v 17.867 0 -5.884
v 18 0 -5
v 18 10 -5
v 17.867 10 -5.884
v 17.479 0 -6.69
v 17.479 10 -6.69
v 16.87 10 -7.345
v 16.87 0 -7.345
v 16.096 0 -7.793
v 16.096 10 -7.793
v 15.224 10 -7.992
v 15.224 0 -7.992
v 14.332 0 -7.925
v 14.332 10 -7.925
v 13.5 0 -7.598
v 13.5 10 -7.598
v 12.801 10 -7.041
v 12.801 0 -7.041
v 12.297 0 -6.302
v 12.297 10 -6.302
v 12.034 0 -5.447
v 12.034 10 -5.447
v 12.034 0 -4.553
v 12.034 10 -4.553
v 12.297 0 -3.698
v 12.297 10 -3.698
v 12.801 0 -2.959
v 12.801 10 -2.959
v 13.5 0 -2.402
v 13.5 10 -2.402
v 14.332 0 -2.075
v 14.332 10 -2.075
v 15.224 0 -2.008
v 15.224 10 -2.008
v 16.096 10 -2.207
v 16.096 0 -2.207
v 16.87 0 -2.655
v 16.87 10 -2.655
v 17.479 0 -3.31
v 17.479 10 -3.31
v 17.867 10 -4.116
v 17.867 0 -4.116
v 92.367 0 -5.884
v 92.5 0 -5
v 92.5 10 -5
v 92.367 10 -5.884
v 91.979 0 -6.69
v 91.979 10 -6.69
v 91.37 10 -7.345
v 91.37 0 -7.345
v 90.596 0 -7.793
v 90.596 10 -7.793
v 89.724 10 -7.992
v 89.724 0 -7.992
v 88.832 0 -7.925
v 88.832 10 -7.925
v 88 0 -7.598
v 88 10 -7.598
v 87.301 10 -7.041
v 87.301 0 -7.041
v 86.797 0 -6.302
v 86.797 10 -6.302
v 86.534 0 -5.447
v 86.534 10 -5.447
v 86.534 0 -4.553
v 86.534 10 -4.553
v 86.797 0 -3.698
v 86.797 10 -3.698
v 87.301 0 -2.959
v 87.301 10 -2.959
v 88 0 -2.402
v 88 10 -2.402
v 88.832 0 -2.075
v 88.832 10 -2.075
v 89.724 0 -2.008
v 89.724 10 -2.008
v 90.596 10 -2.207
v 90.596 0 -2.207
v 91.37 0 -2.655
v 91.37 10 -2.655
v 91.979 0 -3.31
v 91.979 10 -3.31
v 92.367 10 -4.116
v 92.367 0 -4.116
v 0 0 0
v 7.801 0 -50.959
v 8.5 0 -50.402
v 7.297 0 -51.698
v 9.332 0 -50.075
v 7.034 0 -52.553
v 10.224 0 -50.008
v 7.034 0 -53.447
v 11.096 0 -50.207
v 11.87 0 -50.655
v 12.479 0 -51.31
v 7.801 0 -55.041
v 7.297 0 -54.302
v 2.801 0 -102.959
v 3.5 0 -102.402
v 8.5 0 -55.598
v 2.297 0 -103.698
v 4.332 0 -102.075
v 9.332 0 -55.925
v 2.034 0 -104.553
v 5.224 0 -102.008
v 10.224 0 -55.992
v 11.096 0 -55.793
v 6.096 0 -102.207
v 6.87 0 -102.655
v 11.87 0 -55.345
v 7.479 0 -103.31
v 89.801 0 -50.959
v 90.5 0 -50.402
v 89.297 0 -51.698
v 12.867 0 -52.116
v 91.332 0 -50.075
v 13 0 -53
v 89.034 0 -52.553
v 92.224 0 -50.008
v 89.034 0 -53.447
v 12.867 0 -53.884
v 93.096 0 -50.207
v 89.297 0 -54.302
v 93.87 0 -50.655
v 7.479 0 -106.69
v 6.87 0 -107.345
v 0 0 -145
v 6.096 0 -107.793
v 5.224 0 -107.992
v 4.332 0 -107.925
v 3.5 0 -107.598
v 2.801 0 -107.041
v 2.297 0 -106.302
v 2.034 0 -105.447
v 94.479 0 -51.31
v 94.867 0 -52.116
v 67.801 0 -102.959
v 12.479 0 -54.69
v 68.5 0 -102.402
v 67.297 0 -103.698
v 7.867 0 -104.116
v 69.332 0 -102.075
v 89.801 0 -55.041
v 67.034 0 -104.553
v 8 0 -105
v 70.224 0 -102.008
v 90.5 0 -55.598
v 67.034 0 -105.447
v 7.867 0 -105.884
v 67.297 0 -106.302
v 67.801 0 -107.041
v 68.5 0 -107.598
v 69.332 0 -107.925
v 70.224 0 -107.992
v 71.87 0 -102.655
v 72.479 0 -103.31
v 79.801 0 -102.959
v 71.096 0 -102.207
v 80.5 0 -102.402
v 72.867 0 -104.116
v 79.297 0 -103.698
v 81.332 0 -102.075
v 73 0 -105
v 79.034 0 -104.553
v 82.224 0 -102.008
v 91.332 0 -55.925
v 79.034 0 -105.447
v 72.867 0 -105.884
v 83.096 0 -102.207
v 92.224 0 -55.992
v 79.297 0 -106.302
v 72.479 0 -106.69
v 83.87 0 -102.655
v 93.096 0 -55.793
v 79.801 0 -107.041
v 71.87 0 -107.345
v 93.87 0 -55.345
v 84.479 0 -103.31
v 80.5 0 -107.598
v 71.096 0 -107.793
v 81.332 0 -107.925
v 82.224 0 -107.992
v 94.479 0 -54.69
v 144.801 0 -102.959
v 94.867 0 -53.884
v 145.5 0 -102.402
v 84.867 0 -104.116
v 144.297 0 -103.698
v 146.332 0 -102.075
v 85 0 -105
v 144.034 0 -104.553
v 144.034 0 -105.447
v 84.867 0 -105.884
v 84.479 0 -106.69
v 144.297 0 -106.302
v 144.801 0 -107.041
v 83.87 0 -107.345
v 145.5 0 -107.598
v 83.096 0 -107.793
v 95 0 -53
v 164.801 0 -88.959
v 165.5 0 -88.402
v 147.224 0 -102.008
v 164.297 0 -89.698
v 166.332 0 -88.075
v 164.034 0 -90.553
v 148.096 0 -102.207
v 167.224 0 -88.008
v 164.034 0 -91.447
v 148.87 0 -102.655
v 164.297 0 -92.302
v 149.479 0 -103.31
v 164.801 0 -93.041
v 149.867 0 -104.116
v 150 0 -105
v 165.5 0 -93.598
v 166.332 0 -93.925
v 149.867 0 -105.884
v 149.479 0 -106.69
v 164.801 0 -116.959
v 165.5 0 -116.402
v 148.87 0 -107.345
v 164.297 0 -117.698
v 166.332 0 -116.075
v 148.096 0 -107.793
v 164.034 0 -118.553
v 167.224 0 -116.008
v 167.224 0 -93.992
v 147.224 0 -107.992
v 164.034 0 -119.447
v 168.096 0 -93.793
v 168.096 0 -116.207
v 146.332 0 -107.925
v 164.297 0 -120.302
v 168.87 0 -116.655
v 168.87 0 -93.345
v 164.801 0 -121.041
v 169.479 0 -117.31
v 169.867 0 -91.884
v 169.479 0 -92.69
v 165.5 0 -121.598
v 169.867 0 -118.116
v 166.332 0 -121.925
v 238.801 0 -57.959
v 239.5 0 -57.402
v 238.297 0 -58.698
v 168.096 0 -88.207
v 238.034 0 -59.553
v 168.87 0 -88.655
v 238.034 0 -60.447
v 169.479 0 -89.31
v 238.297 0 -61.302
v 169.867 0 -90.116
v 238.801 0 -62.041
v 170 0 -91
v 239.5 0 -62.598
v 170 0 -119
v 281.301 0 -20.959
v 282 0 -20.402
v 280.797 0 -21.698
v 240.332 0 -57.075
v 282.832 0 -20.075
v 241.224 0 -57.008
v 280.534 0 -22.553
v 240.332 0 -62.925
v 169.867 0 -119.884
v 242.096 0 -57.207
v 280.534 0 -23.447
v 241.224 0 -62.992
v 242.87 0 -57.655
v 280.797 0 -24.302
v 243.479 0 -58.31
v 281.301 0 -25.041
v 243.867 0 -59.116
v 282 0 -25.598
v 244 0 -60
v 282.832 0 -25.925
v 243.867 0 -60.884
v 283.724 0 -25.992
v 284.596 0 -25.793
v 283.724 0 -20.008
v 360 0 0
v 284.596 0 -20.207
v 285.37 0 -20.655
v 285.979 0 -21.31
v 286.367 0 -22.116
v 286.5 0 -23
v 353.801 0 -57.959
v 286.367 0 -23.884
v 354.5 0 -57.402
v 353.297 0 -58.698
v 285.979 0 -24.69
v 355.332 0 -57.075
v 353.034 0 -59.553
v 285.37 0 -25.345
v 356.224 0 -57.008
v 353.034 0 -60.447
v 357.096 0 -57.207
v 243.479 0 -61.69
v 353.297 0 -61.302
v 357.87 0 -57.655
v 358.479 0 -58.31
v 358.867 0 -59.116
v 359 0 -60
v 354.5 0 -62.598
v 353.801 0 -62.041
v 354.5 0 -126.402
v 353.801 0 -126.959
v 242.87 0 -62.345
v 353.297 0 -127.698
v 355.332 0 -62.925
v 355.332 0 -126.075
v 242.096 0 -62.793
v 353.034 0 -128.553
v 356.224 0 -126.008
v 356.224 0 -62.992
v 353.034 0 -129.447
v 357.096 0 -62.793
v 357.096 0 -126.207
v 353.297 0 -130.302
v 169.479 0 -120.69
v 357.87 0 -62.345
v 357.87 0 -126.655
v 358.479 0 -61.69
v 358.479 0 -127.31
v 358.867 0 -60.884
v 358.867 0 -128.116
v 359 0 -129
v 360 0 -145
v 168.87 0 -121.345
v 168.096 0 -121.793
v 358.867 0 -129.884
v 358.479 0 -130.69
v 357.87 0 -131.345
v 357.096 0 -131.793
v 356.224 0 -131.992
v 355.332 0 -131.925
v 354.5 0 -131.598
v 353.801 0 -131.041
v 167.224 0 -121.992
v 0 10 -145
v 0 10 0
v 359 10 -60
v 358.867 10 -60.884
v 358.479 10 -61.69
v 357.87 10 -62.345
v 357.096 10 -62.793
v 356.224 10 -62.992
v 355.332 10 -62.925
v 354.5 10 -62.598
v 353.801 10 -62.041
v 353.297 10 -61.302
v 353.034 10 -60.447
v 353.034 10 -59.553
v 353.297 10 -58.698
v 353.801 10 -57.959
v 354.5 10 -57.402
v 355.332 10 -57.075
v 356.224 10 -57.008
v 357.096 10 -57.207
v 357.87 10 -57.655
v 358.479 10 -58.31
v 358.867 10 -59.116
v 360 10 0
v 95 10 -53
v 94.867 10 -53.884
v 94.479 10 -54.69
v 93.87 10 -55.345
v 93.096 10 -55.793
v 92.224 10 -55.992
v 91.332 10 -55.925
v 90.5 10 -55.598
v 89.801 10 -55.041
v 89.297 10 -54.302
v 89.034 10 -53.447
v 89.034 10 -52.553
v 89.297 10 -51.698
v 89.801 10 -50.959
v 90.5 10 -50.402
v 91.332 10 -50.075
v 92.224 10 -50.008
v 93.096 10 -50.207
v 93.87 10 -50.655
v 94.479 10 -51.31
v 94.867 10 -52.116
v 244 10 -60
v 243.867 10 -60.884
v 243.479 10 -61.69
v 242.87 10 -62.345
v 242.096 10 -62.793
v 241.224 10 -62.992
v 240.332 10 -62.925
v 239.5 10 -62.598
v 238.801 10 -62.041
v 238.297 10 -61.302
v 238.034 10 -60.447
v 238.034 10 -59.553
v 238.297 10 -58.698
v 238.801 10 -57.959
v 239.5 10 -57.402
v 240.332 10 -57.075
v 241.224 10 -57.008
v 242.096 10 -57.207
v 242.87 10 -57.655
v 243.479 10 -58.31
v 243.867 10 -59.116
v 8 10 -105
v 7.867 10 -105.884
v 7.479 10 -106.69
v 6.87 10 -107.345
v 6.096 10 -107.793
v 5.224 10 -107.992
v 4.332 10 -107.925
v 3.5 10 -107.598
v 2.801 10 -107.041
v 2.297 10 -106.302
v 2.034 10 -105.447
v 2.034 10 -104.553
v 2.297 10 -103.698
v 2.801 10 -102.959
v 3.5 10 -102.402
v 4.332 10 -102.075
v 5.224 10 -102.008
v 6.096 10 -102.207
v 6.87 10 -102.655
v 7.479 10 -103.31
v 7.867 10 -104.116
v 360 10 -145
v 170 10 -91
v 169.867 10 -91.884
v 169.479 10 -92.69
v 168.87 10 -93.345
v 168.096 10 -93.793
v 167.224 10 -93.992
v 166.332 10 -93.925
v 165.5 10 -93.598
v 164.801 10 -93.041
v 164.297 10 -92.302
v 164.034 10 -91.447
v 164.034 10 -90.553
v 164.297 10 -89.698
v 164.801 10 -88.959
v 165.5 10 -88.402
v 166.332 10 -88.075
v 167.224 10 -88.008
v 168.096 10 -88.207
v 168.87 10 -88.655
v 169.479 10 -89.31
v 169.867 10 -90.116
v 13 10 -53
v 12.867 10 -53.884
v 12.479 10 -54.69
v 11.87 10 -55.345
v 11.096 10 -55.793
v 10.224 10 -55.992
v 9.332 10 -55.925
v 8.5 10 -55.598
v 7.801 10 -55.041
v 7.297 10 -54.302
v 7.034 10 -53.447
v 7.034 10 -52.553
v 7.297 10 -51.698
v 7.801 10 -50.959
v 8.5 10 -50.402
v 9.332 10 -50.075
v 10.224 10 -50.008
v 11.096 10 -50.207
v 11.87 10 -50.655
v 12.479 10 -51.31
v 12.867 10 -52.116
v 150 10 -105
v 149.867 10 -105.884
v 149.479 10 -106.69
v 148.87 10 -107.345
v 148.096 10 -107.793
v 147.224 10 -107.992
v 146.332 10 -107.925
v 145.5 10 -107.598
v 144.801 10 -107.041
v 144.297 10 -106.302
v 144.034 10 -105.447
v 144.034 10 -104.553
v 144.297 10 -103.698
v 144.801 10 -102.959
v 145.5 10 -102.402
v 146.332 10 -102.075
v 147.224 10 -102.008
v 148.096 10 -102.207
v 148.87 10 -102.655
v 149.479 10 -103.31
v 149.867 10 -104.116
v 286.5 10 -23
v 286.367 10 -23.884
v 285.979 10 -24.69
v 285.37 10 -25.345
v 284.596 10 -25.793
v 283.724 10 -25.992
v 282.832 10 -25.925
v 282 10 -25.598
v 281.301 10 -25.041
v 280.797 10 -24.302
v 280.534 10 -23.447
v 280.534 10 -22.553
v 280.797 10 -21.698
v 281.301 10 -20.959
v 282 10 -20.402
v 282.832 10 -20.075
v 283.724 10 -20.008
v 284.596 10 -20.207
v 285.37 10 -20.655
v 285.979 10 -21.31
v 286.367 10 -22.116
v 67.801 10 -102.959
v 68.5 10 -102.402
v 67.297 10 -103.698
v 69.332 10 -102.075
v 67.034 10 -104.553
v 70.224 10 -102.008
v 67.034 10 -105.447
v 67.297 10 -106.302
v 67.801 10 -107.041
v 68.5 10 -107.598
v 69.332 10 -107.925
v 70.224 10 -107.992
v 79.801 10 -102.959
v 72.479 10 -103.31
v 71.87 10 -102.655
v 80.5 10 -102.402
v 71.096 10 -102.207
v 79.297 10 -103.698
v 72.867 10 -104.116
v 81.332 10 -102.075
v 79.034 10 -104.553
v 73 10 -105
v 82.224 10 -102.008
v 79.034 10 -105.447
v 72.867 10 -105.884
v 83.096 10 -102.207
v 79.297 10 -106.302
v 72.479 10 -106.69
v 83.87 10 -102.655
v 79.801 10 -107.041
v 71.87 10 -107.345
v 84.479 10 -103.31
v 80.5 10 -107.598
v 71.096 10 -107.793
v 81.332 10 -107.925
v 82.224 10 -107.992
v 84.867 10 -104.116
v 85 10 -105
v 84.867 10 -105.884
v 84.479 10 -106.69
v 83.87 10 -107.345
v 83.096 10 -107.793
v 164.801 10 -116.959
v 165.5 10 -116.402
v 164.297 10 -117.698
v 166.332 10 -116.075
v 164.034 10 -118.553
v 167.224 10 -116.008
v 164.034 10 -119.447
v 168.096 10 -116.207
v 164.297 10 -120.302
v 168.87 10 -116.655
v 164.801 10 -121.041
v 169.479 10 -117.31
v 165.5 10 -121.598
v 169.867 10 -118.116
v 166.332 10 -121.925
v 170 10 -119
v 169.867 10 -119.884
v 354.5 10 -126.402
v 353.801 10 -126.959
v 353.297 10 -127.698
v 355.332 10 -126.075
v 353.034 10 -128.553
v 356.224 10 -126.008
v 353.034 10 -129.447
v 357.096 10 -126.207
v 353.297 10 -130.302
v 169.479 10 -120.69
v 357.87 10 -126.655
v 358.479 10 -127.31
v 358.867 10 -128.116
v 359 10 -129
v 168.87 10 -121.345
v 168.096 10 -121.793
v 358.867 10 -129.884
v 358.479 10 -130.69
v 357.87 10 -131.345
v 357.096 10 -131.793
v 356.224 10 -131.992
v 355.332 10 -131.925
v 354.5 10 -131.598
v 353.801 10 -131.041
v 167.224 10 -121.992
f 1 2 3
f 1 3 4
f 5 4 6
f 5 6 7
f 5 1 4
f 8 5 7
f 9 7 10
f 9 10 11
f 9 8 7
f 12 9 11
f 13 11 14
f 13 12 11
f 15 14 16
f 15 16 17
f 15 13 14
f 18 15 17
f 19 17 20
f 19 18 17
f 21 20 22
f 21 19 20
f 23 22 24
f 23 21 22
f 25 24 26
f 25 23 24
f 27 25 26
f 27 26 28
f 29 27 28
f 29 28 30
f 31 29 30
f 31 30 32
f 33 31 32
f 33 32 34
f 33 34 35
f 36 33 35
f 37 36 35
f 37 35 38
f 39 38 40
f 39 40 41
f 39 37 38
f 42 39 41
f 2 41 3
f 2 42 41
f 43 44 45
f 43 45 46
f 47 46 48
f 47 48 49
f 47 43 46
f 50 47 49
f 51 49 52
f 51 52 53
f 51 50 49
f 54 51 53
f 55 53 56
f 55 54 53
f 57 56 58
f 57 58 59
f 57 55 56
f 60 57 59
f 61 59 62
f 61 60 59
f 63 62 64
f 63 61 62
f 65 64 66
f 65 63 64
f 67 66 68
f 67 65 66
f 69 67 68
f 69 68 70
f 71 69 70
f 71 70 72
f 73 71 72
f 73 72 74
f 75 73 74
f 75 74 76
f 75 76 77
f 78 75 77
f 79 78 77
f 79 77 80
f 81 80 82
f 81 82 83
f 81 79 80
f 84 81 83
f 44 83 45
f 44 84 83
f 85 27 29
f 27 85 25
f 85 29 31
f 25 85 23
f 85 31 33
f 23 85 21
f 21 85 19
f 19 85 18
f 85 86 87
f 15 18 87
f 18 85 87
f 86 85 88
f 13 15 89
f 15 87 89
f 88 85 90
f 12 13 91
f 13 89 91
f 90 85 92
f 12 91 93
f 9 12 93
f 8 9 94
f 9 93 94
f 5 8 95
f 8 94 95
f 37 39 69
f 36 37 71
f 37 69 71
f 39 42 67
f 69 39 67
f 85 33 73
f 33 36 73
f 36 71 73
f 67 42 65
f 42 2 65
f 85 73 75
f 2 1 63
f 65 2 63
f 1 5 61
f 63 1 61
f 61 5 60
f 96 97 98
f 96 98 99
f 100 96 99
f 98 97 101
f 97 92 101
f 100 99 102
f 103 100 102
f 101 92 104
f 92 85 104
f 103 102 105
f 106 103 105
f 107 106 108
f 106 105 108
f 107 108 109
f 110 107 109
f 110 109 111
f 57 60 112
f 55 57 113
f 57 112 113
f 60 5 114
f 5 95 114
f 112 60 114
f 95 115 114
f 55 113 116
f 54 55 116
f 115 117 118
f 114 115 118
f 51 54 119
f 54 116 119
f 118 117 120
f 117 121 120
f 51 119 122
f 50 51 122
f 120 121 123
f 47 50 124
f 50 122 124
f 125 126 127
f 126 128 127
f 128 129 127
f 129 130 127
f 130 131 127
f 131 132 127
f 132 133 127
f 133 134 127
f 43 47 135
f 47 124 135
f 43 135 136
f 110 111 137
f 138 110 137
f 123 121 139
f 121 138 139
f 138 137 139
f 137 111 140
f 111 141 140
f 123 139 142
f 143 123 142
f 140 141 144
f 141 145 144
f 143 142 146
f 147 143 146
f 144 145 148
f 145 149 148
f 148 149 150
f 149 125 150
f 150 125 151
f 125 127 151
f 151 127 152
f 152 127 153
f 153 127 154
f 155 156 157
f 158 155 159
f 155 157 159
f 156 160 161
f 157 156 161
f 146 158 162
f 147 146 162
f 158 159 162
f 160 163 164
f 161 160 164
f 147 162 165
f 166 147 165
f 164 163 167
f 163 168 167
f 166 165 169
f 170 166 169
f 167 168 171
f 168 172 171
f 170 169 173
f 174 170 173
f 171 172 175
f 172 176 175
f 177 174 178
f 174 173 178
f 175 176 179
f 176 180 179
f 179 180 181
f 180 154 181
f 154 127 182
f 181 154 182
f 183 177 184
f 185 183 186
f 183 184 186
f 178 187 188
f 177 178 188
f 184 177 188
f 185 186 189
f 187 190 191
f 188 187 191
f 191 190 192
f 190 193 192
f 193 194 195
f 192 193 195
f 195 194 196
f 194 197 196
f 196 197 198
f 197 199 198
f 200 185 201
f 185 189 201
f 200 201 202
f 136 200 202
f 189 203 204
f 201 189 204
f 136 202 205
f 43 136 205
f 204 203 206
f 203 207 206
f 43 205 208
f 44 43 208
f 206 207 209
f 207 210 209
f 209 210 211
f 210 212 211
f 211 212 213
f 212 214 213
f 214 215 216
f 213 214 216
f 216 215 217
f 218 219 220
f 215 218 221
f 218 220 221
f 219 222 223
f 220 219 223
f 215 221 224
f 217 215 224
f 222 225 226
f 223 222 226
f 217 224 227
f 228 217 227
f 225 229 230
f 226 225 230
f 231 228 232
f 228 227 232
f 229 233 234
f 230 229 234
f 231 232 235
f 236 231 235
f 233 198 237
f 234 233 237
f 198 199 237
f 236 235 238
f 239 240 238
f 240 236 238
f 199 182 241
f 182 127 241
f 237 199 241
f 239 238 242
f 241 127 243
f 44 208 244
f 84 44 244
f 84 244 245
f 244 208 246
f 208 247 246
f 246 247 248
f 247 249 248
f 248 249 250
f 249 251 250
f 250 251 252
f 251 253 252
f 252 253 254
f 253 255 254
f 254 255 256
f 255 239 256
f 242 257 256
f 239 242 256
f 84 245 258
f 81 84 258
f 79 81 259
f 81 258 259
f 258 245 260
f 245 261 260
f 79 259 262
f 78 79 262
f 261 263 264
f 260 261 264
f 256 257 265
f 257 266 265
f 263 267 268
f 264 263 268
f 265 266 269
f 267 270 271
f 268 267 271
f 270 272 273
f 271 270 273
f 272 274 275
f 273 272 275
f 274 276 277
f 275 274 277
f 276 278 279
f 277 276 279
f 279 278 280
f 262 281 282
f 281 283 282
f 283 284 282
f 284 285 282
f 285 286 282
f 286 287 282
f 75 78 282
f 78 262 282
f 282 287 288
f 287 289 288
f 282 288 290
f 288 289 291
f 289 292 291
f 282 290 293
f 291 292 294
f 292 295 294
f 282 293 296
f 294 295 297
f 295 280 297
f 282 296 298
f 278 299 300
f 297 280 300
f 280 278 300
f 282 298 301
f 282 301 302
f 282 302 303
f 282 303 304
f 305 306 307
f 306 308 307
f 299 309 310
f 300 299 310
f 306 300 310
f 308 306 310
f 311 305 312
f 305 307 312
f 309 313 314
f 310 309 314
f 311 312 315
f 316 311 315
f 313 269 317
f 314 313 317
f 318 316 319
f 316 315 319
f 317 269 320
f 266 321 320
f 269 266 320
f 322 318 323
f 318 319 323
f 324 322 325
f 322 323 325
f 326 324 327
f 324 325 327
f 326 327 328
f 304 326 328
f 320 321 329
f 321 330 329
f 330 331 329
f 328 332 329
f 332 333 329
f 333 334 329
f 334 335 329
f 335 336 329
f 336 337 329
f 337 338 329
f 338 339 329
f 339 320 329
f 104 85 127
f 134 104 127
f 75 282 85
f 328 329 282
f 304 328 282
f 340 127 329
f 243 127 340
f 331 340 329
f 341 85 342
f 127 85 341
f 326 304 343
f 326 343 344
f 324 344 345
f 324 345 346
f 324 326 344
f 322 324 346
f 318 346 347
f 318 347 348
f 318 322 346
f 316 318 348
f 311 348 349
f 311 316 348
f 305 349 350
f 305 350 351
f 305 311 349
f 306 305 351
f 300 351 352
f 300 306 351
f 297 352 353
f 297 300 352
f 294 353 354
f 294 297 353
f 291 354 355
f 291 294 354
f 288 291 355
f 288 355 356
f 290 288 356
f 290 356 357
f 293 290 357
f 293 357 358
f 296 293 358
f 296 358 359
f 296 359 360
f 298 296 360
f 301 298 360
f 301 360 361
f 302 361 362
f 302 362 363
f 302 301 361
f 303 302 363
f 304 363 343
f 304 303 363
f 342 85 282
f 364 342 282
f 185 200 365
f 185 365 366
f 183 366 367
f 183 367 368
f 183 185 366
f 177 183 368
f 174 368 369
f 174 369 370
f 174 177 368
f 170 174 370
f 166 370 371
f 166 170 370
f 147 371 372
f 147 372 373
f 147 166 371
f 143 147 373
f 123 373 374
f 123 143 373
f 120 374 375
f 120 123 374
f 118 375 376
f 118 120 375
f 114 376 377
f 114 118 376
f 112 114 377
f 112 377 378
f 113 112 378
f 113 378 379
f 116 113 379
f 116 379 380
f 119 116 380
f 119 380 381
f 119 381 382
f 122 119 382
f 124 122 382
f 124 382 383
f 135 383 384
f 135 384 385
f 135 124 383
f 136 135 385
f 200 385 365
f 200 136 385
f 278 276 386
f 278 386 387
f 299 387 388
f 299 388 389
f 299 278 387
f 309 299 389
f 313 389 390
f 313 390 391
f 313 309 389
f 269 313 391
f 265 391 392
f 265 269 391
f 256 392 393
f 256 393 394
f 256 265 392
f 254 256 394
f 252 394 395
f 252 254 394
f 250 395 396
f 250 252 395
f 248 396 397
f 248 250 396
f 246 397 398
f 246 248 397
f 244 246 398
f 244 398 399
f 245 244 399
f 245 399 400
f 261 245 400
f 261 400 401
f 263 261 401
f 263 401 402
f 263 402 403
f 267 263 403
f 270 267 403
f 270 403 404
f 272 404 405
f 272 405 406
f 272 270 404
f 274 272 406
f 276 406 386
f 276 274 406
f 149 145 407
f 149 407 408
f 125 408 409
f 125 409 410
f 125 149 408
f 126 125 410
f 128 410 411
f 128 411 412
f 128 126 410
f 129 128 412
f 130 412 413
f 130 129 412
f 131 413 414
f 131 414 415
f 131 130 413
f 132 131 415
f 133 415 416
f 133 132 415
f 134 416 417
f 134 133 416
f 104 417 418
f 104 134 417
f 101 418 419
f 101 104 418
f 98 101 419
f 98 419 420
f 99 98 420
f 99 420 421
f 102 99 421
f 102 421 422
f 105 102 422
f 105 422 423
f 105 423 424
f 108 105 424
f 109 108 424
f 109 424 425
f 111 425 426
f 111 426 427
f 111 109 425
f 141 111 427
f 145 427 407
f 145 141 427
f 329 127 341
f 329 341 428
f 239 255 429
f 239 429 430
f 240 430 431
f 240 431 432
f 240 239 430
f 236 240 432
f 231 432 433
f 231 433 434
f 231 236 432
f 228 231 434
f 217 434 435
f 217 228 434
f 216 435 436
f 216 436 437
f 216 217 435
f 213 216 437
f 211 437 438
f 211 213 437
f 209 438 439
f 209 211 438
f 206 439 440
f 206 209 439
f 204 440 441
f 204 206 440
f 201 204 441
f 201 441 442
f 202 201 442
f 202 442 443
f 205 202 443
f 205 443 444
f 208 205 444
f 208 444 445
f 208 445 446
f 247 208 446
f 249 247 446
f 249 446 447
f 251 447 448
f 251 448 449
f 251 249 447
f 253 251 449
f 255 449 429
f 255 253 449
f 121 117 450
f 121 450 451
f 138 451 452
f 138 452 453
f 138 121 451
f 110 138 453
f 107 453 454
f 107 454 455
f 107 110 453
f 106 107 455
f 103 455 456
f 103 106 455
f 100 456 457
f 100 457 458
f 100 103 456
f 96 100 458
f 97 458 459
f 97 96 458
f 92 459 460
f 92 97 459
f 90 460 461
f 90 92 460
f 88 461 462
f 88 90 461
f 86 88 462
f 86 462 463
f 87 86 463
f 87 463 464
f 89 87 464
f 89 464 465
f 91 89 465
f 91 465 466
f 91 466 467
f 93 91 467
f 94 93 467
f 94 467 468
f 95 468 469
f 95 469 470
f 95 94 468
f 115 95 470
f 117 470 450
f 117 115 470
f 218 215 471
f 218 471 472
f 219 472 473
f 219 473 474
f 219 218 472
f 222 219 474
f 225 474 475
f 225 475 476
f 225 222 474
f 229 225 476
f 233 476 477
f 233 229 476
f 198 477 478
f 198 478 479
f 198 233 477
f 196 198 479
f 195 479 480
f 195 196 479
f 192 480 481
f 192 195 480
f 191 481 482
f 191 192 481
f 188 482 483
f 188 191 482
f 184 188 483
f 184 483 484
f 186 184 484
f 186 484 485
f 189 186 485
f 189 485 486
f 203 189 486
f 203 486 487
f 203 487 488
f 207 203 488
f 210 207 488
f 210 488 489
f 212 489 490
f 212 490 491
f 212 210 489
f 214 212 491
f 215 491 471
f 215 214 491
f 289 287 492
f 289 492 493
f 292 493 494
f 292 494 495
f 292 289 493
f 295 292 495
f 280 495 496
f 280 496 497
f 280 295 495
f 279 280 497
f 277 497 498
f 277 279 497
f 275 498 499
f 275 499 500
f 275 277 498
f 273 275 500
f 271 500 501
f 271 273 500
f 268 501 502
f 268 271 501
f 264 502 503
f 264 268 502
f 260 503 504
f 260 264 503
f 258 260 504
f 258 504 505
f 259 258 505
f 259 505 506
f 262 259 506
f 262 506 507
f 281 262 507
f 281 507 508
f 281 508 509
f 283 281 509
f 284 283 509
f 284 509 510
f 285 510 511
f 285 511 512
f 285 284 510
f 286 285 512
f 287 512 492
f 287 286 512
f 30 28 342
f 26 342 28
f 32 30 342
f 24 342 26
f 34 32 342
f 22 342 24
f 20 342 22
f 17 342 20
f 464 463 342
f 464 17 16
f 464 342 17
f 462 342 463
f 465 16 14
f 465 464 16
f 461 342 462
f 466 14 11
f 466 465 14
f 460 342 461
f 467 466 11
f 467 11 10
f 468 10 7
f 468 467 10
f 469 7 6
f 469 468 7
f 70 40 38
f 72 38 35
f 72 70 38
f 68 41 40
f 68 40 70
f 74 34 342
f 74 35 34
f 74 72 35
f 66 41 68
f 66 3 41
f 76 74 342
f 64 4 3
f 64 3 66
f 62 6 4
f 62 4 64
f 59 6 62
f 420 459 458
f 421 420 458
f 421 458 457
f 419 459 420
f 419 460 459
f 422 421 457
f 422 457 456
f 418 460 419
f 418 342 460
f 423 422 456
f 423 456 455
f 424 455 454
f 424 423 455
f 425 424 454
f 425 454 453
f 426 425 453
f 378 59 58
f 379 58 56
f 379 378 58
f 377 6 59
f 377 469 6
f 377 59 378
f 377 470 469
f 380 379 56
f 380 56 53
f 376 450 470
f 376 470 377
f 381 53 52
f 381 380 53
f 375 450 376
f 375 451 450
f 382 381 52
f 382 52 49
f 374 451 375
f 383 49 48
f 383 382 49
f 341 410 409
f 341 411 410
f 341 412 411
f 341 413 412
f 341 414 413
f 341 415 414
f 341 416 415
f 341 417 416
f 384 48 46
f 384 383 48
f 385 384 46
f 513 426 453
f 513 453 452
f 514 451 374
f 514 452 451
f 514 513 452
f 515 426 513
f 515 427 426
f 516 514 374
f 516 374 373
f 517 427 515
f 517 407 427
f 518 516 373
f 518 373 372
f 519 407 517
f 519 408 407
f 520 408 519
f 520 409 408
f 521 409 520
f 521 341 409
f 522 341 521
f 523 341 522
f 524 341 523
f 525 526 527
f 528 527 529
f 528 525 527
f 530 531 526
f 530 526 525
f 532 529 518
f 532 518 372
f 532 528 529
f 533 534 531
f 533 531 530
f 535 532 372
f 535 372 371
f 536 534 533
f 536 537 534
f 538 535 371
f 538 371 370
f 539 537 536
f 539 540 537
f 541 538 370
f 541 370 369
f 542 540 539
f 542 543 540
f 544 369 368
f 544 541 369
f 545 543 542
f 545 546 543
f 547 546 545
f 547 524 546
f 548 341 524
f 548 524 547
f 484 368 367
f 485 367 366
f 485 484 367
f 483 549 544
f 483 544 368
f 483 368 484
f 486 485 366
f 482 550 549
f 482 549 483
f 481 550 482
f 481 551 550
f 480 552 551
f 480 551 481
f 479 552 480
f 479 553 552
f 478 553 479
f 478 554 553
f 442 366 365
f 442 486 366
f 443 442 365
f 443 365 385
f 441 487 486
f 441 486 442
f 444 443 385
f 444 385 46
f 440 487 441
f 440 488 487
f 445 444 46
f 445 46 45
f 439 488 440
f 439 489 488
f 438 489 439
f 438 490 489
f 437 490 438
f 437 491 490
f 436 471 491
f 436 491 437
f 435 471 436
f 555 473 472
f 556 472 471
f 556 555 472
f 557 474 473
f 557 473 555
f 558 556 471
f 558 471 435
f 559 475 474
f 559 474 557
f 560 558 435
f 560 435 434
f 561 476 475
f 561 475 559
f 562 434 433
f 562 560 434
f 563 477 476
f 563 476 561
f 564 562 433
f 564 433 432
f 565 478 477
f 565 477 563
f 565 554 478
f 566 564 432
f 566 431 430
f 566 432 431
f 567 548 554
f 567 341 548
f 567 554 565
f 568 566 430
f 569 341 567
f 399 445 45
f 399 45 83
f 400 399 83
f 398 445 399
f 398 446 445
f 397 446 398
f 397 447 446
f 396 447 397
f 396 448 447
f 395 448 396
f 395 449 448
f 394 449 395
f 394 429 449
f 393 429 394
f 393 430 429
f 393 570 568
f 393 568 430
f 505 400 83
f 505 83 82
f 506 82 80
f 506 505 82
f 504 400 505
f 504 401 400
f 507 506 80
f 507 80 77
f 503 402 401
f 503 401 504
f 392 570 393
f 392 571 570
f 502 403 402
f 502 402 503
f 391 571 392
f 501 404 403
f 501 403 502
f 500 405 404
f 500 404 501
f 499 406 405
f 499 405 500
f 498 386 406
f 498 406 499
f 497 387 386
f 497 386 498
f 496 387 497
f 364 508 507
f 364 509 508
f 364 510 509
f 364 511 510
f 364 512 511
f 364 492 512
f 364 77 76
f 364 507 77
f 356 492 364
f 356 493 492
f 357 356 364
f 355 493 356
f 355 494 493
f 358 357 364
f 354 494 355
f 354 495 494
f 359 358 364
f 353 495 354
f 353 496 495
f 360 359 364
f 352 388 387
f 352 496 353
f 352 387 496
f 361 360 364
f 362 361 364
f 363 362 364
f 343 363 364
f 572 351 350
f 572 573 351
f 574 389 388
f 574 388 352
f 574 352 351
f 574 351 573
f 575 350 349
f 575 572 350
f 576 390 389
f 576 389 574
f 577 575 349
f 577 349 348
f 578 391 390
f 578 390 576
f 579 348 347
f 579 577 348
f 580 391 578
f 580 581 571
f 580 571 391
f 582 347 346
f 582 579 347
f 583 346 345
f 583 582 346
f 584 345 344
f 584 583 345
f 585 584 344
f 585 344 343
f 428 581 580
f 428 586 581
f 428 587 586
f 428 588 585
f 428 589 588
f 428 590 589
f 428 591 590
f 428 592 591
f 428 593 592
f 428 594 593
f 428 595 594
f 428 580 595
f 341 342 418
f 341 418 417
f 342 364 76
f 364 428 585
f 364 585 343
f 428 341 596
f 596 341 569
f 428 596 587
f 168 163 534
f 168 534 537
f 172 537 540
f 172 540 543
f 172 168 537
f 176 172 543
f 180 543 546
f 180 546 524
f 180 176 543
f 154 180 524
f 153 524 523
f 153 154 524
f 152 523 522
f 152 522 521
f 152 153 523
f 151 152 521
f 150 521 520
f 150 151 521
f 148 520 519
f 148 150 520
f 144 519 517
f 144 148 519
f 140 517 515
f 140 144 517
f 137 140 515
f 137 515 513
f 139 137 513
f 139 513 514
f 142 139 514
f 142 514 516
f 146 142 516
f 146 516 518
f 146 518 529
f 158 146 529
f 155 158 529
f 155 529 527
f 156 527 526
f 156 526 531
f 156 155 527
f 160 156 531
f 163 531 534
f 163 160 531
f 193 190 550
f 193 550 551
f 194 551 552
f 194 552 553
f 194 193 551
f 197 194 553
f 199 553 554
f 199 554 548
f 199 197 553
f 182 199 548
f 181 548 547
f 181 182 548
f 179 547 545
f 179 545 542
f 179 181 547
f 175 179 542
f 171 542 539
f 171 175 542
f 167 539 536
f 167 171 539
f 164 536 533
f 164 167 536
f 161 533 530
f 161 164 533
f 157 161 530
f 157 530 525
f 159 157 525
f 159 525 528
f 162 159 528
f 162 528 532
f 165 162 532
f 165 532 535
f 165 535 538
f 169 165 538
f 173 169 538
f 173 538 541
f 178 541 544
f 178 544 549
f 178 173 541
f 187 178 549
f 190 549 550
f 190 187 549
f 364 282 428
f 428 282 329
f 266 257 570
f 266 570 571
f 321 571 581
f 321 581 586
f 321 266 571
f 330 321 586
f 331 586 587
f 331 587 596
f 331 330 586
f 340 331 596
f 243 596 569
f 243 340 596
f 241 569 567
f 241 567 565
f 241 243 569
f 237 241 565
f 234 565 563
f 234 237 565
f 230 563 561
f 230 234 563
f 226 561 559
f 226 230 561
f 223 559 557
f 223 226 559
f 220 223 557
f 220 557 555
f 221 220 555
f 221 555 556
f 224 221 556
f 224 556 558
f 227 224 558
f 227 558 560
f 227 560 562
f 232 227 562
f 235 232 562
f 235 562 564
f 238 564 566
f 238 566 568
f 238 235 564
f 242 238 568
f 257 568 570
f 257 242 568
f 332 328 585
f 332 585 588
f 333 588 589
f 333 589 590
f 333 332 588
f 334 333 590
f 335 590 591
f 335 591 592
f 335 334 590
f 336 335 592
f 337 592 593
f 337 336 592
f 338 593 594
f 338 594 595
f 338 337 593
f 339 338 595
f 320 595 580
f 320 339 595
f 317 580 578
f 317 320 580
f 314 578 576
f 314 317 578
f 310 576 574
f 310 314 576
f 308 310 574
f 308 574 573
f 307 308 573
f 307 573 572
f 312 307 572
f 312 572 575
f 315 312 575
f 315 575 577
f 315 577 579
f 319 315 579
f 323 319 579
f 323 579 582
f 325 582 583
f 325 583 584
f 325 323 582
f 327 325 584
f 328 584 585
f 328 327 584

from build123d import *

# Parameters (mm, degrees)
SKETCH1_W           = 360
SKETCH1_H           = 145
SKETCH1_R           = 3
BOSS_EXTRUDE1_DEPTH = 10


with BuildPart() as part:
    # Sketch1 → Boss-Extrude1 (new body)
    with BuildSketch(Plane(origin=(0, 0, 0), x_dir=(1, 0, 0), z_dir=(0, 1, 0))):
        with Locations((180, 72.5)):
            Rectangle(SKETCH1_W, SKETCH1_H)
        with Locations((15, 5)):
            Circle(SKETCH1_R, mode=Mode.SUBTRACT)
        with Locations((10, 53)):
            Circle(SKETCH1_R, mode=Mode.SUBTRACT)
        with Locations((92, 53)):
            Circle(SKETCH1_R, mode=Mode.SUBTRACT)
        with Locations((89.5, 5)):
            Circle(SKETCH1_R, mode=Mode.SUBTRACT)
        with Locations((5, 105)):
            Circle(SKETCH1_R, mode=Mode.SUBTRACT)
        with Locations((70, 105)):
            Circle(SKETCH1_R, mode=Mode.SUBTRACT)
        with Locations((82, 105)):
            Circle(SKETCH1_R, mode=Mode.SUBTRACT)
        with Locations((147, 105)):
            Circle(SKETCH1_R, mode=Mode.SUBTRACT)
        with Locations((356, 60)):
            Circle(SKETCH1_R, mode=Mode.SUBTRACT)
        with Locations((356, 129)):
            Circle(SKETCH1_R, mode=Mode.SUBTRACT)
        with Locations((241, 60)):
            Circle(SKETCH1_R, mode=Mode.SUBTRACT)
        with Locations((283.5, 23)):
            Circle(SKETCH1_R, mode=Mode.SUBTRACT)
        with Locations((167, 91)):
            Circle(SKETCH1_R, mode=Mode.SUBTRACT)
        with Locations((167, 119)):
            Circle(SKETCH1_R, mode=Mode.SUBTRACT)
    extrude(amount=BOSS_EXTRUDE1_DEPTH)


solid = part.part
